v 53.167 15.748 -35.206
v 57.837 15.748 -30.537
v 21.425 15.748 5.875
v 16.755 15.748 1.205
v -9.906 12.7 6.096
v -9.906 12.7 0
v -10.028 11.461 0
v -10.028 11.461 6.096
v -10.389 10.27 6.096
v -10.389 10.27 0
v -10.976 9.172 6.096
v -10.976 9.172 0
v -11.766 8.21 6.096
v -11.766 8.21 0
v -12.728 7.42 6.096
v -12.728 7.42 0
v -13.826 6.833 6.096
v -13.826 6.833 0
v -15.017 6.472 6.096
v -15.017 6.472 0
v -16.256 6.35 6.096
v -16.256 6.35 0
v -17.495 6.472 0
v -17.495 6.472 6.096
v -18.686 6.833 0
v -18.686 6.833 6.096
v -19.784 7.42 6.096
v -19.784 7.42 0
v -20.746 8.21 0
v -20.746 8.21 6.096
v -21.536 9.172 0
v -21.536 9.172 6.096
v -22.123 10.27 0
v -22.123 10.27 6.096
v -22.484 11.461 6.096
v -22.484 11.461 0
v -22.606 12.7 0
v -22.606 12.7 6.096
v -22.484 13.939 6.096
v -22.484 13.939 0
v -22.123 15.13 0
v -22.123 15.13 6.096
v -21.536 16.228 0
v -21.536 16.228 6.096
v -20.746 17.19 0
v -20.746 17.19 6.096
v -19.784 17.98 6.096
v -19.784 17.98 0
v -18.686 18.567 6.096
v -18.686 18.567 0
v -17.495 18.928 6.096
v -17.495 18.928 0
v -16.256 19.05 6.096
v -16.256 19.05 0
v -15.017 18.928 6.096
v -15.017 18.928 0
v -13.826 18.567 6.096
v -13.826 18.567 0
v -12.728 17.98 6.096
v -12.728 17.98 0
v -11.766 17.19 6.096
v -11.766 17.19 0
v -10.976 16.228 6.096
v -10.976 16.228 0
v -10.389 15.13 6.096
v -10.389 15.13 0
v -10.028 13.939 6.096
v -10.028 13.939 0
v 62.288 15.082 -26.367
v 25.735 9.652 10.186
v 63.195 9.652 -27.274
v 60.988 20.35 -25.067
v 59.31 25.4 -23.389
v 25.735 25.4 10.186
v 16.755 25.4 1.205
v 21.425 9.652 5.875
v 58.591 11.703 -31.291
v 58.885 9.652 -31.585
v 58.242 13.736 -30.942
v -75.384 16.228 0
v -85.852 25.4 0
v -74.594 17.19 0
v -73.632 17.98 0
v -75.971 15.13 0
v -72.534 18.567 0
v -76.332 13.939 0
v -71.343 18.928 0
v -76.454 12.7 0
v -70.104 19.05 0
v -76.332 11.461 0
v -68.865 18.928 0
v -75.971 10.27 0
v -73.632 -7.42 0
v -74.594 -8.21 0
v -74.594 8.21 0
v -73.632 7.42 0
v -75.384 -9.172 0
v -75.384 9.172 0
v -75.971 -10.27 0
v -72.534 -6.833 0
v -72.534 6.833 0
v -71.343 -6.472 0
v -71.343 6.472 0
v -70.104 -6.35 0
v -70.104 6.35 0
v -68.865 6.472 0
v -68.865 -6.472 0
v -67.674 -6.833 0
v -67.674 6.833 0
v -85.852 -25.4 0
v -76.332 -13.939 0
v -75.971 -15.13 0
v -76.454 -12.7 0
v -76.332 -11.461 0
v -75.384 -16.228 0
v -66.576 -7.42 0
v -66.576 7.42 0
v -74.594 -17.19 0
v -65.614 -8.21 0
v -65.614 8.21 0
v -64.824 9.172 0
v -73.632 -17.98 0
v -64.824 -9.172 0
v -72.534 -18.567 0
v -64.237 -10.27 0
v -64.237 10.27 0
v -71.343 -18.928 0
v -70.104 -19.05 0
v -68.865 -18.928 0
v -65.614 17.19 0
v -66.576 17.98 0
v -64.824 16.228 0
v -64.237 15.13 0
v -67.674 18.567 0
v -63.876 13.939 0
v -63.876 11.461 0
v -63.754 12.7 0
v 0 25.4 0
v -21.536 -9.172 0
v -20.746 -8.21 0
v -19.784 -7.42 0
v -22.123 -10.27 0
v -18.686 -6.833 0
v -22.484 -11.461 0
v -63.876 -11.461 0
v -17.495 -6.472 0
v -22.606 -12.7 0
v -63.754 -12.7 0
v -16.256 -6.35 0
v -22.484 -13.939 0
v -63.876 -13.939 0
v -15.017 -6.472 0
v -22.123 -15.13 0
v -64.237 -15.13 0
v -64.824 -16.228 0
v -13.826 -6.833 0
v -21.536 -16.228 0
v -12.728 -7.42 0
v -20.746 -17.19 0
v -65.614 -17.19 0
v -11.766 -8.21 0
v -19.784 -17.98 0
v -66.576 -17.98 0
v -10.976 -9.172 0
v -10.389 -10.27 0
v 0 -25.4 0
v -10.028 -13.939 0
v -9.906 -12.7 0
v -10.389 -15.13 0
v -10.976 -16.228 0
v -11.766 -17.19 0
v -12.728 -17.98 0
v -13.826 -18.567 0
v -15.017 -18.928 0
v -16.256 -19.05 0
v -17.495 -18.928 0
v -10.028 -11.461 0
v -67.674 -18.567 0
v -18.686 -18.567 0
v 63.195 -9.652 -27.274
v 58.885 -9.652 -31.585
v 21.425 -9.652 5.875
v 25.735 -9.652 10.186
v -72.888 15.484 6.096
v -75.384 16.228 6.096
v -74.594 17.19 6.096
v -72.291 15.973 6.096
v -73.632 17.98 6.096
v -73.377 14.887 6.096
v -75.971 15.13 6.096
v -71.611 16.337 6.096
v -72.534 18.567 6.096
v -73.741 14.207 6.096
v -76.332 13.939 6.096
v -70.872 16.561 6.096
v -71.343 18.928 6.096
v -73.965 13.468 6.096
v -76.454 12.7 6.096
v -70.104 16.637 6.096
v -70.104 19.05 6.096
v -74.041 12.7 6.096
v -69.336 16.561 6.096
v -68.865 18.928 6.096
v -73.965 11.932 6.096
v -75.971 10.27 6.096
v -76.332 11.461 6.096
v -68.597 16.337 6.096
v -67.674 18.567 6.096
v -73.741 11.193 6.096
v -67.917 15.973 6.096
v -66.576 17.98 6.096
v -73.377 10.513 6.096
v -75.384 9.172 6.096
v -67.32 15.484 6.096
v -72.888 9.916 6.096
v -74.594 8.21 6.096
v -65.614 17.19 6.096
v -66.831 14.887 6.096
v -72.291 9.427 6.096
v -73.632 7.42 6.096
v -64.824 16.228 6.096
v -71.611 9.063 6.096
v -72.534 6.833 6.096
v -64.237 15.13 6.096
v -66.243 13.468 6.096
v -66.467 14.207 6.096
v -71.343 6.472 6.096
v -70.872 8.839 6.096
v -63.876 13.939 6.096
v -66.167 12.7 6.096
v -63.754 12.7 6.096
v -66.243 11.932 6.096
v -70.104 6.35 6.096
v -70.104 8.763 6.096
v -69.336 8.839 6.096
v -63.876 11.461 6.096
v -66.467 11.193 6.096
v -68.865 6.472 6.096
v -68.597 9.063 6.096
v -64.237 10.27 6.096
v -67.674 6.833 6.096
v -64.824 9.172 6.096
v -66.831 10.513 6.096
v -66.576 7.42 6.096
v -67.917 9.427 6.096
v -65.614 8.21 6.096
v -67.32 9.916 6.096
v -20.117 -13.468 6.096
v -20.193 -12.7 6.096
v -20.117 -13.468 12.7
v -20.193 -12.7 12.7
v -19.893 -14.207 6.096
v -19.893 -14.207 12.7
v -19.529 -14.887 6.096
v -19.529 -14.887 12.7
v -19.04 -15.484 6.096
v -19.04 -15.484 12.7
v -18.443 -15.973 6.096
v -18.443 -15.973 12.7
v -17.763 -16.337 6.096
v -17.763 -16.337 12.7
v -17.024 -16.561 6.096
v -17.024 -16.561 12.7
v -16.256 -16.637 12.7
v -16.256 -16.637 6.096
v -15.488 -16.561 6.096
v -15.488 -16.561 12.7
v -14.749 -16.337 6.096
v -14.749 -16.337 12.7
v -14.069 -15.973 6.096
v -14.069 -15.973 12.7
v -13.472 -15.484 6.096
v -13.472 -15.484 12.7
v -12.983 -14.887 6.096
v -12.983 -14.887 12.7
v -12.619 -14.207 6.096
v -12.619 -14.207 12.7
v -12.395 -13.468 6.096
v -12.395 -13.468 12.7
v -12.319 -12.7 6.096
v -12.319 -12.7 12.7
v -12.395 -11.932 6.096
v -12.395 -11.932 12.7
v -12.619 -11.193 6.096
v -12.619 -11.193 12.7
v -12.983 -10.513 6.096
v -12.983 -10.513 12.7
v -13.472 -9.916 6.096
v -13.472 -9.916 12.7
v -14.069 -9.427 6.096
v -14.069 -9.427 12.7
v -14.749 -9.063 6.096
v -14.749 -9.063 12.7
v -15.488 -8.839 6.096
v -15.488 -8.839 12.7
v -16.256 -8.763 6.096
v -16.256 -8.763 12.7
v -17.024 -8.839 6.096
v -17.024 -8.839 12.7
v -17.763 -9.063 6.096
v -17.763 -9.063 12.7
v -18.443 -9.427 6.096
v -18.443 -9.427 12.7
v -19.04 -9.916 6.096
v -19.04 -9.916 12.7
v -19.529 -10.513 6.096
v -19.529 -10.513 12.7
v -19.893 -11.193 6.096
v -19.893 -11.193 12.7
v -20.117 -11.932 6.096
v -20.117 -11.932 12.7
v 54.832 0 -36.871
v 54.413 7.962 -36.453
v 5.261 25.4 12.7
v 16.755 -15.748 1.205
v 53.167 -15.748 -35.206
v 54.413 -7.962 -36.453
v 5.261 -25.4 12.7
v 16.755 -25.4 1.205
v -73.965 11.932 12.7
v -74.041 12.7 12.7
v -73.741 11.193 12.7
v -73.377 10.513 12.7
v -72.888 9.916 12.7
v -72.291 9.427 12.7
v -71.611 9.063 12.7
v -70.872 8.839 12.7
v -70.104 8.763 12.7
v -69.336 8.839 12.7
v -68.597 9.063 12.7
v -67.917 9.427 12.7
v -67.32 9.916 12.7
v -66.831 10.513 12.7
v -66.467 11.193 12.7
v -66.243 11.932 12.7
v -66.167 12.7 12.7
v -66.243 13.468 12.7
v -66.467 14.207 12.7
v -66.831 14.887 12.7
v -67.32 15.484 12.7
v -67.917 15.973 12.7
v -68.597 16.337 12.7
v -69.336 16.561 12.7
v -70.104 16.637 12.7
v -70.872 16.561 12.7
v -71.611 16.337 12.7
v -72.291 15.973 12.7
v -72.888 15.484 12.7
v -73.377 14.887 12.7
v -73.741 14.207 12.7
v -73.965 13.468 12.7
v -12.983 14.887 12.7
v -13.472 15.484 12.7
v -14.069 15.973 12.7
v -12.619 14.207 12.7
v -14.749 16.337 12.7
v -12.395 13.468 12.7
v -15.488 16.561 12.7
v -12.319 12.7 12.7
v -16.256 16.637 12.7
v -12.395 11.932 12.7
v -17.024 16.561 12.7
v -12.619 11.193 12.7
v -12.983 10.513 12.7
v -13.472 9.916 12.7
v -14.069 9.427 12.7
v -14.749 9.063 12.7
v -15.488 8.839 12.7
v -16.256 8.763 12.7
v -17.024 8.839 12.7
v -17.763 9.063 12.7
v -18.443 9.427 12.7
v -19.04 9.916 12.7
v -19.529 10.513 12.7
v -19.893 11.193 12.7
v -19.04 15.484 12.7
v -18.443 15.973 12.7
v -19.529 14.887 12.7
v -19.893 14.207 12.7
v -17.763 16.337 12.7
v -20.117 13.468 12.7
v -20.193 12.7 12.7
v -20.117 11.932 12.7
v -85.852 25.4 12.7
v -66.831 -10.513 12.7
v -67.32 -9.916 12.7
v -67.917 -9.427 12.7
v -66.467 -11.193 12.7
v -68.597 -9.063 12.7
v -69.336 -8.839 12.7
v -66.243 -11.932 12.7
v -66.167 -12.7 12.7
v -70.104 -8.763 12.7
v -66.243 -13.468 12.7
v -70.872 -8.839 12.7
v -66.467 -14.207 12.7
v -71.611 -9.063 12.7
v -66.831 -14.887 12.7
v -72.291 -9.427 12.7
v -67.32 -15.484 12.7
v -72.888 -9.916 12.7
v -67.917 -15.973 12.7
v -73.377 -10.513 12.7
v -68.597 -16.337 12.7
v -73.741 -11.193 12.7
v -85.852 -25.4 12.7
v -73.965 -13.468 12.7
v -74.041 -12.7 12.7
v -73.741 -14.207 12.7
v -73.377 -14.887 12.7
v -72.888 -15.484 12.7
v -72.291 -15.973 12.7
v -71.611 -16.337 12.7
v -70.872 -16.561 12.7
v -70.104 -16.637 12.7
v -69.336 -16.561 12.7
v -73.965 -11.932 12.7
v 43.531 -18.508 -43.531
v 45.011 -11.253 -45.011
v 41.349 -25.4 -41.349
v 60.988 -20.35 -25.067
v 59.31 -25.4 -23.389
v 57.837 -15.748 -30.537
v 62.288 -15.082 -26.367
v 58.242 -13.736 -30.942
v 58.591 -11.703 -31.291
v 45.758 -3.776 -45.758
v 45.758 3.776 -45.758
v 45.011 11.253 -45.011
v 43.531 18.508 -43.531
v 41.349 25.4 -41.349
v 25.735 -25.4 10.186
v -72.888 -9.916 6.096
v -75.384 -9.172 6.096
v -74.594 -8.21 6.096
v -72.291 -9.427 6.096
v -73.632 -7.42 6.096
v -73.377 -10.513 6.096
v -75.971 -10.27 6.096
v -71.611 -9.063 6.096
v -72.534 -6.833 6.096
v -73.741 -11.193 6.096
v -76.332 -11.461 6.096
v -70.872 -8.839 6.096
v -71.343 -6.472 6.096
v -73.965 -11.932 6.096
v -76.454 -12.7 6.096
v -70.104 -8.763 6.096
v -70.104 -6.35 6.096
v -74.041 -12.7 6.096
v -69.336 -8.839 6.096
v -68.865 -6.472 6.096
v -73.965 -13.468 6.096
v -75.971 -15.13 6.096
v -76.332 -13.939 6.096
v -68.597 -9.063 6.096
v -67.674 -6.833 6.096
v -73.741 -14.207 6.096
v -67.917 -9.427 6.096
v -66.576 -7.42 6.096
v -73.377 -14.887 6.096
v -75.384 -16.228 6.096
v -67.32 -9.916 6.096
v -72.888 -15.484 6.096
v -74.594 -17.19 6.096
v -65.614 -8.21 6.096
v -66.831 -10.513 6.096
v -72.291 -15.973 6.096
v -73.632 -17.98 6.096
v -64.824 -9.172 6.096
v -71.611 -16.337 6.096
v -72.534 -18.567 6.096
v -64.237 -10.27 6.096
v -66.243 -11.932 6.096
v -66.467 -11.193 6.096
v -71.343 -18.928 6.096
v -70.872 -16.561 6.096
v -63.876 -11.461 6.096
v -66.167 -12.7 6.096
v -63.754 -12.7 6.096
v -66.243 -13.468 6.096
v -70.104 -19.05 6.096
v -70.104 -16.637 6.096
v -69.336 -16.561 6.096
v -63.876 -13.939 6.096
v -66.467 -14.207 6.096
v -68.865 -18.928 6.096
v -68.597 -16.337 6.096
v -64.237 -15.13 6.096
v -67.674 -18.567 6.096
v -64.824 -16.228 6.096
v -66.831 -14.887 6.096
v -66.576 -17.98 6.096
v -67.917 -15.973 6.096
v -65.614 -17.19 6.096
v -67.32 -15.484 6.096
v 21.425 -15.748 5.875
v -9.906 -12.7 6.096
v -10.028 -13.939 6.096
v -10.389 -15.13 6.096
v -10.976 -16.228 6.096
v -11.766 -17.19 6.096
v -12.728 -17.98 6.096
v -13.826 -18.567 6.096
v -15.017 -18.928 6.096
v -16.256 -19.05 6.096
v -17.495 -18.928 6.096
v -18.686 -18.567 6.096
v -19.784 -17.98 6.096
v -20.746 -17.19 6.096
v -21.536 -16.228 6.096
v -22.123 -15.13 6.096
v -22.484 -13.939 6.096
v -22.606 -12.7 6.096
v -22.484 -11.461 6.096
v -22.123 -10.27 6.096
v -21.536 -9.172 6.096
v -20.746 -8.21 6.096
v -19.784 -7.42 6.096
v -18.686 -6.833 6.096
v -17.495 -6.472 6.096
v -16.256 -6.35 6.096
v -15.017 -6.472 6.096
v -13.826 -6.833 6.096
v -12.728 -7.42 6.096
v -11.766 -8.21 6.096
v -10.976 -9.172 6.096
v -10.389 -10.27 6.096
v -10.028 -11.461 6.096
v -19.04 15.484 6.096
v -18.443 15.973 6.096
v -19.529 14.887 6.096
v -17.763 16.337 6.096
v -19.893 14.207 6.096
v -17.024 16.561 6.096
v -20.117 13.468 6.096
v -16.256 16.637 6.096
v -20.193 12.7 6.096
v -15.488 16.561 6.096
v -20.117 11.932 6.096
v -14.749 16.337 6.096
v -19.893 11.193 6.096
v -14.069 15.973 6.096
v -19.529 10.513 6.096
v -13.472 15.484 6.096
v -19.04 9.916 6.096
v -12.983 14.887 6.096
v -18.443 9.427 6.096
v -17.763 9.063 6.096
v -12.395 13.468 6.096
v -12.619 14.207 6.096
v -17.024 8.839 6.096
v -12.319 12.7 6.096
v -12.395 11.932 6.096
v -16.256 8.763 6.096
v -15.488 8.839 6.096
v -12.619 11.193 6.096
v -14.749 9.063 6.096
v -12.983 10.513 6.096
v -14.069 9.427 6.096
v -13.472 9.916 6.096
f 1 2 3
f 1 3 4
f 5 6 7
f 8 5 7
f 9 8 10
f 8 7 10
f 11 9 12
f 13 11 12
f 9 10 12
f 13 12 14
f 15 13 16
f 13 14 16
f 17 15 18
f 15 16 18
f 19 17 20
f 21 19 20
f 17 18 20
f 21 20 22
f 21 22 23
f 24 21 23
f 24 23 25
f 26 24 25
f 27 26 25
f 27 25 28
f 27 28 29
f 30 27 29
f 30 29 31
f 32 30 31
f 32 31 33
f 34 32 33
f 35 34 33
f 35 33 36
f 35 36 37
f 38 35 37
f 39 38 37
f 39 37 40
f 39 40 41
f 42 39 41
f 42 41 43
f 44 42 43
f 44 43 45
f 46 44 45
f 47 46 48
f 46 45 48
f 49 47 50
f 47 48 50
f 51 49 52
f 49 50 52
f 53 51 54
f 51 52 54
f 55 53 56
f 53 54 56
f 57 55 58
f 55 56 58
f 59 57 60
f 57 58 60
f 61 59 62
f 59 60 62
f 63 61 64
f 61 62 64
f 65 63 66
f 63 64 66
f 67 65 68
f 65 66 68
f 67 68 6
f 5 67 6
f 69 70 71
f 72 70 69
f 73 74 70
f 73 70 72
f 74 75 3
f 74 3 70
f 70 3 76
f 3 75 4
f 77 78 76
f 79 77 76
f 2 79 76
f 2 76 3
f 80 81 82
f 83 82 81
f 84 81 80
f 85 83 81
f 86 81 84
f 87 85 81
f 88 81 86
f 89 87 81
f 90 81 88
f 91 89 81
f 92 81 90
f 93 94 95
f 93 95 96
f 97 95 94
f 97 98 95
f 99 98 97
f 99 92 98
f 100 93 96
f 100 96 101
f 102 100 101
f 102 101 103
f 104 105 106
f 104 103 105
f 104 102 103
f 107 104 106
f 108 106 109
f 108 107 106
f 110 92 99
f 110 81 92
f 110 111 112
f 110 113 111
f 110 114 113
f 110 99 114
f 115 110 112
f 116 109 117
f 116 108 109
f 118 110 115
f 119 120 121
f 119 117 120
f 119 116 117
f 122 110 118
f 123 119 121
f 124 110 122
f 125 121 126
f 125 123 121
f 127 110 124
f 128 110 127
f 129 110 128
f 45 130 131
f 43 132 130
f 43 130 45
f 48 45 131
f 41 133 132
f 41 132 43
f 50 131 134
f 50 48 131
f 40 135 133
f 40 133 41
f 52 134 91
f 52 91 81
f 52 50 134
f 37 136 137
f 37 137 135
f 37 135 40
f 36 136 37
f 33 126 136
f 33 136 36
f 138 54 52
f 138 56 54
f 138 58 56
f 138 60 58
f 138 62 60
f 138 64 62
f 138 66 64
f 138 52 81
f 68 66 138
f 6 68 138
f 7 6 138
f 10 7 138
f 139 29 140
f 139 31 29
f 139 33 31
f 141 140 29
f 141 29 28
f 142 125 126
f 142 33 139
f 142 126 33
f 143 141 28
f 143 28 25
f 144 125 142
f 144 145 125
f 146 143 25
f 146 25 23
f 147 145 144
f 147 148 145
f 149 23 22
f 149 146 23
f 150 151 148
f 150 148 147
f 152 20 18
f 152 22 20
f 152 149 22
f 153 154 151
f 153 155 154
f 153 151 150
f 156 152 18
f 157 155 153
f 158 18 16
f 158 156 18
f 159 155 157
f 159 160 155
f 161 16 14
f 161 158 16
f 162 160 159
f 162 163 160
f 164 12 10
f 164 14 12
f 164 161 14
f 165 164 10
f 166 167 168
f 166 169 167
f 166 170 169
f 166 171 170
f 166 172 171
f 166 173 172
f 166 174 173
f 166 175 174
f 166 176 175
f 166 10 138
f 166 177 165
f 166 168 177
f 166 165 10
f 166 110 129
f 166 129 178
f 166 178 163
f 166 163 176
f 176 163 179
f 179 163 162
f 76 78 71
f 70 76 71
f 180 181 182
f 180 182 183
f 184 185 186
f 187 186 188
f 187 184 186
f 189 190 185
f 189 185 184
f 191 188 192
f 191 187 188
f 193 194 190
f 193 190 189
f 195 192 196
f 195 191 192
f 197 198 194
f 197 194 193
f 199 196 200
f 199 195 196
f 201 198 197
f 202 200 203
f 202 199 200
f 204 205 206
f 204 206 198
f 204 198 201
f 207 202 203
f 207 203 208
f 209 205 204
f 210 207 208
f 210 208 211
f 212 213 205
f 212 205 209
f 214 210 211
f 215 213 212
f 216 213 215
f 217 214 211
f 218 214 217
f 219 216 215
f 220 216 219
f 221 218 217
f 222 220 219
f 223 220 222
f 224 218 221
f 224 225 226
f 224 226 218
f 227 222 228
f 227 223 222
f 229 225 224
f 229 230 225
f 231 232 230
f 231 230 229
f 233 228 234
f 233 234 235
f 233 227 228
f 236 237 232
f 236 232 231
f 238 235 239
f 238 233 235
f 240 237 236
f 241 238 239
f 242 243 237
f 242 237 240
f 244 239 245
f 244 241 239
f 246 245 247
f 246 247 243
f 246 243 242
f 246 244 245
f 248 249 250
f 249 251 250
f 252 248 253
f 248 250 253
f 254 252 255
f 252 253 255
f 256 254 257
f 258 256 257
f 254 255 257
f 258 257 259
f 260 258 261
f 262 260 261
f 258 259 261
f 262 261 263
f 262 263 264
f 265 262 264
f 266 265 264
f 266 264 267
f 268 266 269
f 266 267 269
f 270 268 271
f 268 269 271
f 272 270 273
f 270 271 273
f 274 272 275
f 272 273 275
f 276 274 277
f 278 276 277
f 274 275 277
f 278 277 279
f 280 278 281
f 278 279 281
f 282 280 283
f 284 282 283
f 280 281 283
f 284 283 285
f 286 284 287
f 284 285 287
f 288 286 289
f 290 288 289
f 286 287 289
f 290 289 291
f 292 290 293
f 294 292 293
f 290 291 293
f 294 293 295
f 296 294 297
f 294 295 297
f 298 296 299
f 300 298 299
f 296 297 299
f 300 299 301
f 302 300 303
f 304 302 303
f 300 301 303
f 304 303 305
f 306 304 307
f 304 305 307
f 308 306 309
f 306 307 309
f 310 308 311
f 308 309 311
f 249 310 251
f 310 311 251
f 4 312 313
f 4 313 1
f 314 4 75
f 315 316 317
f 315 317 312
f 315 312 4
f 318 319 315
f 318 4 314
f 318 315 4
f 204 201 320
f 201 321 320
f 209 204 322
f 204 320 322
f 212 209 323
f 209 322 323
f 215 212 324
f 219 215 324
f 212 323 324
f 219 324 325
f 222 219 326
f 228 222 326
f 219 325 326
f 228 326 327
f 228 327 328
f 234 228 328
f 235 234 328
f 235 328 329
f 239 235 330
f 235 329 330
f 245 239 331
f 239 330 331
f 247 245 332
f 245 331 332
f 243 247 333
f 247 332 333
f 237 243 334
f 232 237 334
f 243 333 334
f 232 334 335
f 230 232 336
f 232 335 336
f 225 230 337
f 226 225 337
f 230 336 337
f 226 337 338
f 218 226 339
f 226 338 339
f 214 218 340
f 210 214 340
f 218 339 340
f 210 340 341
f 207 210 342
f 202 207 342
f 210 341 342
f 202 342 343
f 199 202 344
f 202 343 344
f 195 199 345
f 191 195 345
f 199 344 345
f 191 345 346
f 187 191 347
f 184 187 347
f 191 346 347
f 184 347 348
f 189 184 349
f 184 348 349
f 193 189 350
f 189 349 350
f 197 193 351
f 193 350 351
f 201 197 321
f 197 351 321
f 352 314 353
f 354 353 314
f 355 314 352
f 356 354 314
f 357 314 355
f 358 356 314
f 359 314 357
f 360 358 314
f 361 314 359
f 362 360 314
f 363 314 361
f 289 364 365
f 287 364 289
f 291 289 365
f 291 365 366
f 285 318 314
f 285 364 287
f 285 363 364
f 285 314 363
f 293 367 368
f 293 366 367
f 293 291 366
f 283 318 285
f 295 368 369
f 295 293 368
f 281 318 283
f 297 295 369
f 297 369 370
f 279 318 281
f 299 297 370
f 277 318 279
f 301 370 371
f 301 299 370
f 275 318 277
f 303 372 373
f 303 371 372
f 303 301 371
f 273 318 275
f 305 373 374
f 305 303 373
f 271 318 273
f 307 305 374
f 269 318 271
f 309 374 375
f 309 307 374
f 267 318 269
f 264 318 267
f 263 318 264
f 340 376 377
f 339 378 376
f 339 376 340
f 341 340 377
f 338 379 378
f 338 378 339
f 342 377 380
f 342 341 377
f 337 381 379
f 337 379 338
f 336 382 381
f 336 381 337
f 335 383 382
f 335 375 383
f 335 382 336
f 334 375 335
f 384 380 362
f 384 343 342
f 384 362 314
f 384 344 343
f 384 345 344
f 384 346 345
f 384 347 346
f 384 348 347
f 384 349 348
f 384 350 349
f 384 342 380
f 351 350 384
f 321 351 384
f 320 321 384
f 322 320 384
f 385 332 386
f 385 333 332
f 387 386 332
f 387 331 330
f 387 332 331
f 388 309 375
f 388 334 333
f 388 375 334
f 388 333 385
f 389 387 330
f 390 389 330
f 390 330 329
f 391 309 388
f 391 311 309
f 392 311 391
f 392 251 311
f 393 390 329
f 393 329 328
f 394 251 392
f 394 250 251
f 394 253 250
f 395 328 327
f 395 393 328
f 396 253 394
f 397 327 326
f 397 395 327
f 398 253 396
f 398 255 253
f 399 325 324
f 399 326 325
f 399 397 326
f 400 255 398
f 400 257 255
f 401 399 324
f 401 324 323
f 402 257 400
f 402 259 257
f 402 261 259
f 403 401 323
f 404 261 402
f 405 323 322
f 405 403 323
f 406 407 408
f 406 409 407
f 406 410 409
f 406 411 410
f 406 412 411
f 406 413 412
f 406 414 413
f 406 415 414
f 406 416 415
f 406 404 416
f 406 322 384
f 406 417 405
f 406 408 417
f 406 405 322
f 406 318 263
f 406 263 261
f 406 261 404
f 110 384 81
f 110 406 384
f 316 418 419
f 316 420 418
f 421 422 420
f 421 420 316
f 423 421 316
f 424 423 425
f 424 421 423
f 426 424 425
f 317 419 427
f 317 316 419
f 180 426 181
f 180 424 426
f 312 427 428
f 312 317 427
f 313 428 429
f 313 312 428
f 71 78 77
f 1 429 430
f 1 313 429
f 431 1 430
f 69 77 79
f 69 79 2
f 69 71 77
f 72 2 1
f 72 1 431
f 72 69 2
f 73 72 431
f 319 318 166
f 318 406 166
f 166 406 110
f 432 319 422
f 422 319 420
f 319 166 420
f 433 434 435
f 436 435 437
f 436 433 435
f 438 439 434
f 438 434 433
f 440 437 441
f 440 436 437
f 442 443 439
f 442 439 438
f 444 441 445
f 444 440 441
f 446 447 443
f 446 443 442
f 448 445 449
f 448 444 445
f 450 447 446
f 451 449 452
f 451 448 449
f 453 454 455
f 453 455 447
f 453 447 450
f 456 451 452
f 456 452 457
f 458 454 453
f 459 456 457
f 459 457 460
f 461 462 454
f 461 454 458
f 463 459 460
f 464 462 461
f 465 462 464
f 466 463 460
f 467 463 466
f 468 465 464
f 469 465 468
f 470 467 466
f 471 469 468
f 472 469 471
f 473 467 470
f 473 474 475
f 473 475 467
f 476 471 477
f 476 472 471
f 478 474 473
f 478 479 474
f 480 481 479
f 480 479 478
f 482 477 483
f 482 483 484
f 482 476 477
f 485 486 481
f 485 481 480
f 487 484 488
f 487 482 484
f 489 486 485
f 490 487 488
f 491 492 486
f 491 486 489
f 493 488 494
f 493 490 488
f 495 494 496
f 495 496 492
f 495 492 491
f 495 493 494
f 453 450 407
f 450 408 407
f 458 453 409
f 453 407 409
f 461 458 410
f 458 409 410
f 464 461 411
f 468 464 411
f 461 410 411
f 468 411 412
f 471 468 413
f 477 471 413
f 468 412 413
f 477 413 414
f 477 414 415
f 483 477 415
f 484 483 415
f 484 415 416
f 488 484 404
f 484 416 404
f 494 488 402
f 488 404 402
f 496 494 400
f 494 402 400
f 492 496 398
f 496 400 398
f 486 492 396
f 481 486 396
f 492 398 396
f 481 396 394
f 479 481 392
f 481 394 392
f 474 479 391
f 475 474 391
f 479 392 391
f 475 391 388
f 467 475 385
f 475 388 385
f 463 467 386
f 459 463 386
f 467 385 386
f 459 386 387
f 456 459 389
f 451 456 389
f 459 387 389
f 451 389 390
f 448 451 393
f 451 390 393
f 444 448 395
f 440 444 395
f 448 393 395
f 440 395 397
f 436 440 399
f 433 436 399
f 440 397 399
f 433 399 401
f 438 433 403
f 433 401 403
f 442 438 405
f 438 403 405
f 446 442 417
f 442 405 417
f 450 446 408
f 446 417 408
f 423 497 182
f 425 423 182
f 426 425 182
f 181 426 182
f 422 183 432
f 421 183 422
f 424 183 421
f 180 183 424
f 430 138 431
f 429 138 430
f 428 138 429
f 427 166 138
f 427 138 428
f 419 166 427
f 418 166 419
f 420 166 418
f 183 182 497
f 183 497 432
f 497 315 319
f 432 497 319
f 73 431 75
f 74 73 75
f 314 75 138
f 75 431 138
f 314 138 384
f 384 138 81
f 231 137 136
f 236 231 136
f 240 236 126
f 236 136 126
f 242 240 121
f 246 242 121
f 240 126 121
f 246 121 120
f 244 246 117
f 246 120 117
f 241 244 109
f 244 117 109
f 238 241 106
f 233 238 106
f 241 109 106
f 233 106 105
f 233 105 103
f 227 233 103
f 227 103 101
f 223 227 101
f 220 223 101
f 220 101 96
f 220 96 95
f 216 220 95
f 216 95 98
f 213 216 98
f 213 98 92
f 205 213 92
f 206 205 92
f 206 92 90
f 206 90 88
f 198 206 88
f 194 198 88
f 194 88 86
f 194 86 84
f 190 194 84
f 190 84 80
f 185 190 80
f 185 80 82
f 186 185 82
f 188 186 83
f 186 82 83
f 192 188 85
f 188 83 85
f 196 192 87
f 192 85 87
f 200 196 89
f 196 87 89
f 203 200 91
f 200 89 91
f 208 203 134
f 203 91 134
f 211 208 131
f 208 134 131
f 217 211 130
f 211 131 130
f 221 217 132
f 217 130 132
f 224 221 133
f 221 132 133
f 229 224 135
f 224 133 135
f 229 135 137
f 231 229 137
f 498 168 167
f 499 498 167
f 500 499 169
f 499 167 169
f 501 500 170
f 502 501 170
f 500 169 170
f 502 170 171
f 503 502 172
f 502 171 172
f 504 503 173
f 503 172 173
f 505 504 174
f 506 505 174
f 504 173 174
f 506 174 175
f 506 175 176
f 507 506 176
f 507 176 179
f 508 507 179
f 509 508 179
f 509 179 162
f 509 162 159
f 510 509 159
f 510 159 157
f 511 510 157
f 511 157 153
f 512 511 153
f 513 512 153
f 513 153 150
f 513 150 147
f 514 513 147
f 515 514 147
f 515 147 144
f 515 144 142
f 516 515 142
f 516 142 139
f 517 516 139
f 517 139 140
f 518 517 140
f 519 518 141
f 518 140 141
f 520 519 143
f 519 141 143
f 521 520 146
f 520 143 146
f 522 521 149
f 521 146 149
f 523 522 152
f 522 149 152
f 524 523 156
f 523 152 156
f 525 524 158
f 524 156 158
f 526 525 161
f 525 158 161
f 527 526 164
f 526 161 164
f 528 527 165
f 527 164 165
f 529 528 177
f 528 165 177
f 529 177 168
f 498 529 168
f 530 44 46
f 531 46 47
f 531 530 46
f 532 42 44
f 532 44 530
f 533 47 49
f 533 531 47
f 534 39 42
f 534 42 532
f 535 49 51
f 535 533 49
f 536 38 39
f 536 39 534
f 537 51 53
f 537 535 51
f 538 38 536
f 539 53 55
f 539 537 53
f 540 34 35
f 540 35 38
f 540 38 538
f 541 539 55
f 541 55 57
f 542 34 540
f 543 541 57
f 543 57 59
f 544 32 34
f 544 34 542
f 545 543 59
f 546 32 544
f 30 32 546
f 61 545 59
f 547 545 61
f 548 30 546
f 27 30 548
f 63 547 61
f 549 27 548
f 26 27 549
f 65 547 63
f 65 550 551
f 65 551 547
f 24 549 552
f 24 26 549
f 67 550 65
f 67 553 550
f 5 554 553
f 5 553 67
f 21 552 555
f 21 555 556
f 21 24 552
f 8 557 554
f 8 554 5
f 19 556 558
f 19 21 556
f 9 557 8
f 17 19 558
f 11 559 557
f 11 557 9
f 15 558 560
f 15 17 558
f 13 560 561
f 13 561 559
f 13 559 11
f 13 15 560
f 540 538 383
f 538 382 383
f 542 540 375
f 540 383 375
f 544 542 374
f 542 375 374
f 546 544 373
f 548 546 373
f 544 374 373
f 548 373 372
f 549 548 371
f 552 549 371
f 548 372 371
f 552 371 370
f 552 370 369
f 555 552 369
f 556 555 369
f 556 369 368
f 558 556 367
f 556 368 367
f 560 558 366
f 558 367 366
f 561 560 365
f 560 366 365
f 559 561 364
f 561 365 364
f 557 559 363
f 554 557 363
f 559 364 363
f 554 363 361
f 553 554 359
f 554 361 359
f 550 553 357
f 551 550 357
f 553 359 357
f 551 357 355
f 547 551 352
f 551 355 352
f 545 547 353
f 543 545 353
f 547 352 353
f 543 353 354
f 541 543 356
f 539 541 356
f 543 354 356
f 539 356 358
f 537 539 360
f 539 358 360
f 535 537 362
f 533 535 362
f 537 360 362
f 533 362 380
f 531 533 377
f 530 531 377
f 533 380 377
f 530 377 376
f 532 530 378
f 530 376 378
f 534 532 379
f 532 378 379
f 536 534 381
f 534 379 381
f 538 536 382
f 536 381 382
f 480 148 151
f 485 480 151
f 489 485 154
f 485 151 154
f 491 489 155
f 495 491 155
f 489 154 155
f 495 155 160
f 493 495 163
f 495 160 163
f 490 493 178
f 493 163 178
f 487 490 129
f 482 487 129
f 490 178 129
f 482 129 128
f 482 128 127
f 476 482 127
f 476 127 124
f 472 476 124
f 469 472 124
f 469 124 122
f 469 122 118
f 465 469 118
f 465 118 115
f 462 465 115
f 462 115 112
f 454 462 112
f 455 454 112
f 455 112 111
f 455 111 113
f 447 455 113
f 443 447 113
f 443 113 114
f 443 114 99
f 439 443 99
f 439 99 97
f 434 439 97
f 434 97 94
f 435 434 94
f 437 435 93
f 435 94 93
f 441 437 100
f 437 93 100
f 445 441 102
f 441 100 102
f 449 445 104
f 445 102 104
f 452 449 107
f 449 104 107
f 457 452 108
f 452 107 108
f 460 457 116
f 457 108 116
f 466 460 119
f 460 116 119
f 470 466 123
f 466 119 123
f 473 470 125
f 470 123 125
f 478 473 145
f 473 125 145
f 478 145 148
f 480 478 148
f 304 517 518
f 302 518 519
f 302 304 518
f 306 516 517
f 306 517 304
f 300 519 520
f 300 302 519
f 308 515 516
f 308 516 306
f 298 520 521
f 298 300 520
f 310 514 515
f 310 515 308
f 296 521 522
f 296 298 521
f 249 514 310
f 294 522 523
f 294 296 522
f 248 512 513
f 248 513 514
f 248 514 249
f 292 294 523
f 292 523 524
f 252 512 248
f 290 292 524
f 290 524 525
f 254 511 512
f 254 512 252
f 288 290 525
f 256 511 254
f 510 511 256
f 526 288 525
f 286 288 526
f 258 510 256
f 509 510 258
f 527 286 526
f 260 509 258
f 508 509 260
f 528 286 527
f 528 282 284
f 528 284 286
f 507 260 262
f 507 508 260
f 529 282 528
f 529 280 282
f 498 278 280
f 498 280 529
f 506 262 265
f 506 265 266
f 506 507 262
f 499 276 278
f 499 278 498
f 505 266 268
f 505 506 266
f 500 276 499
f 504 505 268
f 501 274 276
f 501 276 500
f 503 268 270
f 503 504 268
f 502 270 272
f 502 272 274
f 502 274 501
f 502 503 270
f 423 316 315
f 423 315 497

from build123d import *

# Parameters (mm, degrees)
F1_DEPTH       = 25.4
F3_D           = 7.874
F3_CBORE_D     = 12.7
F3_CBORE_DEPTH = 6.096
F5_DEPTH       = 12.7
F6_DEPTH       = 105.8292752574
F7_W           = 19.304
F7_H           = 6.096
F8_DEPTH       = 66.549


with BuildPart() as f1:
    # F0 (on Front) → F1 (new body, symmetric)
    with BuildSketch(Plane.XZ):
        Polygon((-85.852, 0), (0, 0), (45.8512699094, -45.8512699094), (54.8315260304, -36.8710137883), (5.2605122421, 12.7), (-85.852, 12.7), align=None)
    extrude(amount=F1_DEPTH, both=True)

    # F3 (through all)
    with Locations(Plane(origin=(0, 0, 0), x_dir=(1, 0, 0), z_dir=(0, 0, -1))):
        with Locations((-70.104, 12.7), (-16.256, 12.7), (-16.256, -12.7), (-70.104, -12.7)):
            CounterBoreHole(F3_D / 2, F3_CBORE_D / 2, F3_CBORE_DEPTH)

    # F4 (on face) → F5 (join)
    with BuildSketch(Plane(origin=(8.9802561211, 0, 8.9802561211), x_dir=(0.7071067812, 0, -0.7071067812), z_dir=(0.7071067812, 0, 0.7071067812))):
        with BuildLine():
            Line((10.9954877579, -25.4), (58.4765061126, -25.4))
            ThreePointArc((58.4765061126, -25.4), (64.8434877579, 0), (58.4765061126, 25.4))
            Line((58.4765061126, 25.4), (10.9954877579, 25.4))
            Line((10.9954877579, 25.4), (10.9954877579, -25.4))
        make_face()
    extrude(amount=F5_DEPTH)

    # F6 (cut, through all): faces of the model
    f6_faces = [f1.faces().sort_by_distance(p)[0] for p in [
        (53.495770348, -19.1275210106, -35.5352581058),
        (53.495770348, 19.1275210106, -35.5352581058),
    ]]
    extrude(f6_faces, amount=-F6_DEPTH, mode=Mode.SUBTRACT)

    # F7 (on face) → F8 (cut, through all)
    with BuildSketch(Plane(origin=(7.774983956, 0, -7.774983956), x_dir=(0, -1, 0), z_dir=(-0.7071067812, 0, 0.7071067812))):
        Polygon((-15.748, 19.304), (-15.748, 12.7), (15.748, 12.7), (15.748, 19.304), (9.652, 19.304), (-9.652, 19.304), align=None)
        with Locations((0, 22.352)):
            Rectangle(F7_W, F7_H)
    extrude(amount=-F8_DEPTH, mode=Mode.SUBTRACT)


solid = f1.part
